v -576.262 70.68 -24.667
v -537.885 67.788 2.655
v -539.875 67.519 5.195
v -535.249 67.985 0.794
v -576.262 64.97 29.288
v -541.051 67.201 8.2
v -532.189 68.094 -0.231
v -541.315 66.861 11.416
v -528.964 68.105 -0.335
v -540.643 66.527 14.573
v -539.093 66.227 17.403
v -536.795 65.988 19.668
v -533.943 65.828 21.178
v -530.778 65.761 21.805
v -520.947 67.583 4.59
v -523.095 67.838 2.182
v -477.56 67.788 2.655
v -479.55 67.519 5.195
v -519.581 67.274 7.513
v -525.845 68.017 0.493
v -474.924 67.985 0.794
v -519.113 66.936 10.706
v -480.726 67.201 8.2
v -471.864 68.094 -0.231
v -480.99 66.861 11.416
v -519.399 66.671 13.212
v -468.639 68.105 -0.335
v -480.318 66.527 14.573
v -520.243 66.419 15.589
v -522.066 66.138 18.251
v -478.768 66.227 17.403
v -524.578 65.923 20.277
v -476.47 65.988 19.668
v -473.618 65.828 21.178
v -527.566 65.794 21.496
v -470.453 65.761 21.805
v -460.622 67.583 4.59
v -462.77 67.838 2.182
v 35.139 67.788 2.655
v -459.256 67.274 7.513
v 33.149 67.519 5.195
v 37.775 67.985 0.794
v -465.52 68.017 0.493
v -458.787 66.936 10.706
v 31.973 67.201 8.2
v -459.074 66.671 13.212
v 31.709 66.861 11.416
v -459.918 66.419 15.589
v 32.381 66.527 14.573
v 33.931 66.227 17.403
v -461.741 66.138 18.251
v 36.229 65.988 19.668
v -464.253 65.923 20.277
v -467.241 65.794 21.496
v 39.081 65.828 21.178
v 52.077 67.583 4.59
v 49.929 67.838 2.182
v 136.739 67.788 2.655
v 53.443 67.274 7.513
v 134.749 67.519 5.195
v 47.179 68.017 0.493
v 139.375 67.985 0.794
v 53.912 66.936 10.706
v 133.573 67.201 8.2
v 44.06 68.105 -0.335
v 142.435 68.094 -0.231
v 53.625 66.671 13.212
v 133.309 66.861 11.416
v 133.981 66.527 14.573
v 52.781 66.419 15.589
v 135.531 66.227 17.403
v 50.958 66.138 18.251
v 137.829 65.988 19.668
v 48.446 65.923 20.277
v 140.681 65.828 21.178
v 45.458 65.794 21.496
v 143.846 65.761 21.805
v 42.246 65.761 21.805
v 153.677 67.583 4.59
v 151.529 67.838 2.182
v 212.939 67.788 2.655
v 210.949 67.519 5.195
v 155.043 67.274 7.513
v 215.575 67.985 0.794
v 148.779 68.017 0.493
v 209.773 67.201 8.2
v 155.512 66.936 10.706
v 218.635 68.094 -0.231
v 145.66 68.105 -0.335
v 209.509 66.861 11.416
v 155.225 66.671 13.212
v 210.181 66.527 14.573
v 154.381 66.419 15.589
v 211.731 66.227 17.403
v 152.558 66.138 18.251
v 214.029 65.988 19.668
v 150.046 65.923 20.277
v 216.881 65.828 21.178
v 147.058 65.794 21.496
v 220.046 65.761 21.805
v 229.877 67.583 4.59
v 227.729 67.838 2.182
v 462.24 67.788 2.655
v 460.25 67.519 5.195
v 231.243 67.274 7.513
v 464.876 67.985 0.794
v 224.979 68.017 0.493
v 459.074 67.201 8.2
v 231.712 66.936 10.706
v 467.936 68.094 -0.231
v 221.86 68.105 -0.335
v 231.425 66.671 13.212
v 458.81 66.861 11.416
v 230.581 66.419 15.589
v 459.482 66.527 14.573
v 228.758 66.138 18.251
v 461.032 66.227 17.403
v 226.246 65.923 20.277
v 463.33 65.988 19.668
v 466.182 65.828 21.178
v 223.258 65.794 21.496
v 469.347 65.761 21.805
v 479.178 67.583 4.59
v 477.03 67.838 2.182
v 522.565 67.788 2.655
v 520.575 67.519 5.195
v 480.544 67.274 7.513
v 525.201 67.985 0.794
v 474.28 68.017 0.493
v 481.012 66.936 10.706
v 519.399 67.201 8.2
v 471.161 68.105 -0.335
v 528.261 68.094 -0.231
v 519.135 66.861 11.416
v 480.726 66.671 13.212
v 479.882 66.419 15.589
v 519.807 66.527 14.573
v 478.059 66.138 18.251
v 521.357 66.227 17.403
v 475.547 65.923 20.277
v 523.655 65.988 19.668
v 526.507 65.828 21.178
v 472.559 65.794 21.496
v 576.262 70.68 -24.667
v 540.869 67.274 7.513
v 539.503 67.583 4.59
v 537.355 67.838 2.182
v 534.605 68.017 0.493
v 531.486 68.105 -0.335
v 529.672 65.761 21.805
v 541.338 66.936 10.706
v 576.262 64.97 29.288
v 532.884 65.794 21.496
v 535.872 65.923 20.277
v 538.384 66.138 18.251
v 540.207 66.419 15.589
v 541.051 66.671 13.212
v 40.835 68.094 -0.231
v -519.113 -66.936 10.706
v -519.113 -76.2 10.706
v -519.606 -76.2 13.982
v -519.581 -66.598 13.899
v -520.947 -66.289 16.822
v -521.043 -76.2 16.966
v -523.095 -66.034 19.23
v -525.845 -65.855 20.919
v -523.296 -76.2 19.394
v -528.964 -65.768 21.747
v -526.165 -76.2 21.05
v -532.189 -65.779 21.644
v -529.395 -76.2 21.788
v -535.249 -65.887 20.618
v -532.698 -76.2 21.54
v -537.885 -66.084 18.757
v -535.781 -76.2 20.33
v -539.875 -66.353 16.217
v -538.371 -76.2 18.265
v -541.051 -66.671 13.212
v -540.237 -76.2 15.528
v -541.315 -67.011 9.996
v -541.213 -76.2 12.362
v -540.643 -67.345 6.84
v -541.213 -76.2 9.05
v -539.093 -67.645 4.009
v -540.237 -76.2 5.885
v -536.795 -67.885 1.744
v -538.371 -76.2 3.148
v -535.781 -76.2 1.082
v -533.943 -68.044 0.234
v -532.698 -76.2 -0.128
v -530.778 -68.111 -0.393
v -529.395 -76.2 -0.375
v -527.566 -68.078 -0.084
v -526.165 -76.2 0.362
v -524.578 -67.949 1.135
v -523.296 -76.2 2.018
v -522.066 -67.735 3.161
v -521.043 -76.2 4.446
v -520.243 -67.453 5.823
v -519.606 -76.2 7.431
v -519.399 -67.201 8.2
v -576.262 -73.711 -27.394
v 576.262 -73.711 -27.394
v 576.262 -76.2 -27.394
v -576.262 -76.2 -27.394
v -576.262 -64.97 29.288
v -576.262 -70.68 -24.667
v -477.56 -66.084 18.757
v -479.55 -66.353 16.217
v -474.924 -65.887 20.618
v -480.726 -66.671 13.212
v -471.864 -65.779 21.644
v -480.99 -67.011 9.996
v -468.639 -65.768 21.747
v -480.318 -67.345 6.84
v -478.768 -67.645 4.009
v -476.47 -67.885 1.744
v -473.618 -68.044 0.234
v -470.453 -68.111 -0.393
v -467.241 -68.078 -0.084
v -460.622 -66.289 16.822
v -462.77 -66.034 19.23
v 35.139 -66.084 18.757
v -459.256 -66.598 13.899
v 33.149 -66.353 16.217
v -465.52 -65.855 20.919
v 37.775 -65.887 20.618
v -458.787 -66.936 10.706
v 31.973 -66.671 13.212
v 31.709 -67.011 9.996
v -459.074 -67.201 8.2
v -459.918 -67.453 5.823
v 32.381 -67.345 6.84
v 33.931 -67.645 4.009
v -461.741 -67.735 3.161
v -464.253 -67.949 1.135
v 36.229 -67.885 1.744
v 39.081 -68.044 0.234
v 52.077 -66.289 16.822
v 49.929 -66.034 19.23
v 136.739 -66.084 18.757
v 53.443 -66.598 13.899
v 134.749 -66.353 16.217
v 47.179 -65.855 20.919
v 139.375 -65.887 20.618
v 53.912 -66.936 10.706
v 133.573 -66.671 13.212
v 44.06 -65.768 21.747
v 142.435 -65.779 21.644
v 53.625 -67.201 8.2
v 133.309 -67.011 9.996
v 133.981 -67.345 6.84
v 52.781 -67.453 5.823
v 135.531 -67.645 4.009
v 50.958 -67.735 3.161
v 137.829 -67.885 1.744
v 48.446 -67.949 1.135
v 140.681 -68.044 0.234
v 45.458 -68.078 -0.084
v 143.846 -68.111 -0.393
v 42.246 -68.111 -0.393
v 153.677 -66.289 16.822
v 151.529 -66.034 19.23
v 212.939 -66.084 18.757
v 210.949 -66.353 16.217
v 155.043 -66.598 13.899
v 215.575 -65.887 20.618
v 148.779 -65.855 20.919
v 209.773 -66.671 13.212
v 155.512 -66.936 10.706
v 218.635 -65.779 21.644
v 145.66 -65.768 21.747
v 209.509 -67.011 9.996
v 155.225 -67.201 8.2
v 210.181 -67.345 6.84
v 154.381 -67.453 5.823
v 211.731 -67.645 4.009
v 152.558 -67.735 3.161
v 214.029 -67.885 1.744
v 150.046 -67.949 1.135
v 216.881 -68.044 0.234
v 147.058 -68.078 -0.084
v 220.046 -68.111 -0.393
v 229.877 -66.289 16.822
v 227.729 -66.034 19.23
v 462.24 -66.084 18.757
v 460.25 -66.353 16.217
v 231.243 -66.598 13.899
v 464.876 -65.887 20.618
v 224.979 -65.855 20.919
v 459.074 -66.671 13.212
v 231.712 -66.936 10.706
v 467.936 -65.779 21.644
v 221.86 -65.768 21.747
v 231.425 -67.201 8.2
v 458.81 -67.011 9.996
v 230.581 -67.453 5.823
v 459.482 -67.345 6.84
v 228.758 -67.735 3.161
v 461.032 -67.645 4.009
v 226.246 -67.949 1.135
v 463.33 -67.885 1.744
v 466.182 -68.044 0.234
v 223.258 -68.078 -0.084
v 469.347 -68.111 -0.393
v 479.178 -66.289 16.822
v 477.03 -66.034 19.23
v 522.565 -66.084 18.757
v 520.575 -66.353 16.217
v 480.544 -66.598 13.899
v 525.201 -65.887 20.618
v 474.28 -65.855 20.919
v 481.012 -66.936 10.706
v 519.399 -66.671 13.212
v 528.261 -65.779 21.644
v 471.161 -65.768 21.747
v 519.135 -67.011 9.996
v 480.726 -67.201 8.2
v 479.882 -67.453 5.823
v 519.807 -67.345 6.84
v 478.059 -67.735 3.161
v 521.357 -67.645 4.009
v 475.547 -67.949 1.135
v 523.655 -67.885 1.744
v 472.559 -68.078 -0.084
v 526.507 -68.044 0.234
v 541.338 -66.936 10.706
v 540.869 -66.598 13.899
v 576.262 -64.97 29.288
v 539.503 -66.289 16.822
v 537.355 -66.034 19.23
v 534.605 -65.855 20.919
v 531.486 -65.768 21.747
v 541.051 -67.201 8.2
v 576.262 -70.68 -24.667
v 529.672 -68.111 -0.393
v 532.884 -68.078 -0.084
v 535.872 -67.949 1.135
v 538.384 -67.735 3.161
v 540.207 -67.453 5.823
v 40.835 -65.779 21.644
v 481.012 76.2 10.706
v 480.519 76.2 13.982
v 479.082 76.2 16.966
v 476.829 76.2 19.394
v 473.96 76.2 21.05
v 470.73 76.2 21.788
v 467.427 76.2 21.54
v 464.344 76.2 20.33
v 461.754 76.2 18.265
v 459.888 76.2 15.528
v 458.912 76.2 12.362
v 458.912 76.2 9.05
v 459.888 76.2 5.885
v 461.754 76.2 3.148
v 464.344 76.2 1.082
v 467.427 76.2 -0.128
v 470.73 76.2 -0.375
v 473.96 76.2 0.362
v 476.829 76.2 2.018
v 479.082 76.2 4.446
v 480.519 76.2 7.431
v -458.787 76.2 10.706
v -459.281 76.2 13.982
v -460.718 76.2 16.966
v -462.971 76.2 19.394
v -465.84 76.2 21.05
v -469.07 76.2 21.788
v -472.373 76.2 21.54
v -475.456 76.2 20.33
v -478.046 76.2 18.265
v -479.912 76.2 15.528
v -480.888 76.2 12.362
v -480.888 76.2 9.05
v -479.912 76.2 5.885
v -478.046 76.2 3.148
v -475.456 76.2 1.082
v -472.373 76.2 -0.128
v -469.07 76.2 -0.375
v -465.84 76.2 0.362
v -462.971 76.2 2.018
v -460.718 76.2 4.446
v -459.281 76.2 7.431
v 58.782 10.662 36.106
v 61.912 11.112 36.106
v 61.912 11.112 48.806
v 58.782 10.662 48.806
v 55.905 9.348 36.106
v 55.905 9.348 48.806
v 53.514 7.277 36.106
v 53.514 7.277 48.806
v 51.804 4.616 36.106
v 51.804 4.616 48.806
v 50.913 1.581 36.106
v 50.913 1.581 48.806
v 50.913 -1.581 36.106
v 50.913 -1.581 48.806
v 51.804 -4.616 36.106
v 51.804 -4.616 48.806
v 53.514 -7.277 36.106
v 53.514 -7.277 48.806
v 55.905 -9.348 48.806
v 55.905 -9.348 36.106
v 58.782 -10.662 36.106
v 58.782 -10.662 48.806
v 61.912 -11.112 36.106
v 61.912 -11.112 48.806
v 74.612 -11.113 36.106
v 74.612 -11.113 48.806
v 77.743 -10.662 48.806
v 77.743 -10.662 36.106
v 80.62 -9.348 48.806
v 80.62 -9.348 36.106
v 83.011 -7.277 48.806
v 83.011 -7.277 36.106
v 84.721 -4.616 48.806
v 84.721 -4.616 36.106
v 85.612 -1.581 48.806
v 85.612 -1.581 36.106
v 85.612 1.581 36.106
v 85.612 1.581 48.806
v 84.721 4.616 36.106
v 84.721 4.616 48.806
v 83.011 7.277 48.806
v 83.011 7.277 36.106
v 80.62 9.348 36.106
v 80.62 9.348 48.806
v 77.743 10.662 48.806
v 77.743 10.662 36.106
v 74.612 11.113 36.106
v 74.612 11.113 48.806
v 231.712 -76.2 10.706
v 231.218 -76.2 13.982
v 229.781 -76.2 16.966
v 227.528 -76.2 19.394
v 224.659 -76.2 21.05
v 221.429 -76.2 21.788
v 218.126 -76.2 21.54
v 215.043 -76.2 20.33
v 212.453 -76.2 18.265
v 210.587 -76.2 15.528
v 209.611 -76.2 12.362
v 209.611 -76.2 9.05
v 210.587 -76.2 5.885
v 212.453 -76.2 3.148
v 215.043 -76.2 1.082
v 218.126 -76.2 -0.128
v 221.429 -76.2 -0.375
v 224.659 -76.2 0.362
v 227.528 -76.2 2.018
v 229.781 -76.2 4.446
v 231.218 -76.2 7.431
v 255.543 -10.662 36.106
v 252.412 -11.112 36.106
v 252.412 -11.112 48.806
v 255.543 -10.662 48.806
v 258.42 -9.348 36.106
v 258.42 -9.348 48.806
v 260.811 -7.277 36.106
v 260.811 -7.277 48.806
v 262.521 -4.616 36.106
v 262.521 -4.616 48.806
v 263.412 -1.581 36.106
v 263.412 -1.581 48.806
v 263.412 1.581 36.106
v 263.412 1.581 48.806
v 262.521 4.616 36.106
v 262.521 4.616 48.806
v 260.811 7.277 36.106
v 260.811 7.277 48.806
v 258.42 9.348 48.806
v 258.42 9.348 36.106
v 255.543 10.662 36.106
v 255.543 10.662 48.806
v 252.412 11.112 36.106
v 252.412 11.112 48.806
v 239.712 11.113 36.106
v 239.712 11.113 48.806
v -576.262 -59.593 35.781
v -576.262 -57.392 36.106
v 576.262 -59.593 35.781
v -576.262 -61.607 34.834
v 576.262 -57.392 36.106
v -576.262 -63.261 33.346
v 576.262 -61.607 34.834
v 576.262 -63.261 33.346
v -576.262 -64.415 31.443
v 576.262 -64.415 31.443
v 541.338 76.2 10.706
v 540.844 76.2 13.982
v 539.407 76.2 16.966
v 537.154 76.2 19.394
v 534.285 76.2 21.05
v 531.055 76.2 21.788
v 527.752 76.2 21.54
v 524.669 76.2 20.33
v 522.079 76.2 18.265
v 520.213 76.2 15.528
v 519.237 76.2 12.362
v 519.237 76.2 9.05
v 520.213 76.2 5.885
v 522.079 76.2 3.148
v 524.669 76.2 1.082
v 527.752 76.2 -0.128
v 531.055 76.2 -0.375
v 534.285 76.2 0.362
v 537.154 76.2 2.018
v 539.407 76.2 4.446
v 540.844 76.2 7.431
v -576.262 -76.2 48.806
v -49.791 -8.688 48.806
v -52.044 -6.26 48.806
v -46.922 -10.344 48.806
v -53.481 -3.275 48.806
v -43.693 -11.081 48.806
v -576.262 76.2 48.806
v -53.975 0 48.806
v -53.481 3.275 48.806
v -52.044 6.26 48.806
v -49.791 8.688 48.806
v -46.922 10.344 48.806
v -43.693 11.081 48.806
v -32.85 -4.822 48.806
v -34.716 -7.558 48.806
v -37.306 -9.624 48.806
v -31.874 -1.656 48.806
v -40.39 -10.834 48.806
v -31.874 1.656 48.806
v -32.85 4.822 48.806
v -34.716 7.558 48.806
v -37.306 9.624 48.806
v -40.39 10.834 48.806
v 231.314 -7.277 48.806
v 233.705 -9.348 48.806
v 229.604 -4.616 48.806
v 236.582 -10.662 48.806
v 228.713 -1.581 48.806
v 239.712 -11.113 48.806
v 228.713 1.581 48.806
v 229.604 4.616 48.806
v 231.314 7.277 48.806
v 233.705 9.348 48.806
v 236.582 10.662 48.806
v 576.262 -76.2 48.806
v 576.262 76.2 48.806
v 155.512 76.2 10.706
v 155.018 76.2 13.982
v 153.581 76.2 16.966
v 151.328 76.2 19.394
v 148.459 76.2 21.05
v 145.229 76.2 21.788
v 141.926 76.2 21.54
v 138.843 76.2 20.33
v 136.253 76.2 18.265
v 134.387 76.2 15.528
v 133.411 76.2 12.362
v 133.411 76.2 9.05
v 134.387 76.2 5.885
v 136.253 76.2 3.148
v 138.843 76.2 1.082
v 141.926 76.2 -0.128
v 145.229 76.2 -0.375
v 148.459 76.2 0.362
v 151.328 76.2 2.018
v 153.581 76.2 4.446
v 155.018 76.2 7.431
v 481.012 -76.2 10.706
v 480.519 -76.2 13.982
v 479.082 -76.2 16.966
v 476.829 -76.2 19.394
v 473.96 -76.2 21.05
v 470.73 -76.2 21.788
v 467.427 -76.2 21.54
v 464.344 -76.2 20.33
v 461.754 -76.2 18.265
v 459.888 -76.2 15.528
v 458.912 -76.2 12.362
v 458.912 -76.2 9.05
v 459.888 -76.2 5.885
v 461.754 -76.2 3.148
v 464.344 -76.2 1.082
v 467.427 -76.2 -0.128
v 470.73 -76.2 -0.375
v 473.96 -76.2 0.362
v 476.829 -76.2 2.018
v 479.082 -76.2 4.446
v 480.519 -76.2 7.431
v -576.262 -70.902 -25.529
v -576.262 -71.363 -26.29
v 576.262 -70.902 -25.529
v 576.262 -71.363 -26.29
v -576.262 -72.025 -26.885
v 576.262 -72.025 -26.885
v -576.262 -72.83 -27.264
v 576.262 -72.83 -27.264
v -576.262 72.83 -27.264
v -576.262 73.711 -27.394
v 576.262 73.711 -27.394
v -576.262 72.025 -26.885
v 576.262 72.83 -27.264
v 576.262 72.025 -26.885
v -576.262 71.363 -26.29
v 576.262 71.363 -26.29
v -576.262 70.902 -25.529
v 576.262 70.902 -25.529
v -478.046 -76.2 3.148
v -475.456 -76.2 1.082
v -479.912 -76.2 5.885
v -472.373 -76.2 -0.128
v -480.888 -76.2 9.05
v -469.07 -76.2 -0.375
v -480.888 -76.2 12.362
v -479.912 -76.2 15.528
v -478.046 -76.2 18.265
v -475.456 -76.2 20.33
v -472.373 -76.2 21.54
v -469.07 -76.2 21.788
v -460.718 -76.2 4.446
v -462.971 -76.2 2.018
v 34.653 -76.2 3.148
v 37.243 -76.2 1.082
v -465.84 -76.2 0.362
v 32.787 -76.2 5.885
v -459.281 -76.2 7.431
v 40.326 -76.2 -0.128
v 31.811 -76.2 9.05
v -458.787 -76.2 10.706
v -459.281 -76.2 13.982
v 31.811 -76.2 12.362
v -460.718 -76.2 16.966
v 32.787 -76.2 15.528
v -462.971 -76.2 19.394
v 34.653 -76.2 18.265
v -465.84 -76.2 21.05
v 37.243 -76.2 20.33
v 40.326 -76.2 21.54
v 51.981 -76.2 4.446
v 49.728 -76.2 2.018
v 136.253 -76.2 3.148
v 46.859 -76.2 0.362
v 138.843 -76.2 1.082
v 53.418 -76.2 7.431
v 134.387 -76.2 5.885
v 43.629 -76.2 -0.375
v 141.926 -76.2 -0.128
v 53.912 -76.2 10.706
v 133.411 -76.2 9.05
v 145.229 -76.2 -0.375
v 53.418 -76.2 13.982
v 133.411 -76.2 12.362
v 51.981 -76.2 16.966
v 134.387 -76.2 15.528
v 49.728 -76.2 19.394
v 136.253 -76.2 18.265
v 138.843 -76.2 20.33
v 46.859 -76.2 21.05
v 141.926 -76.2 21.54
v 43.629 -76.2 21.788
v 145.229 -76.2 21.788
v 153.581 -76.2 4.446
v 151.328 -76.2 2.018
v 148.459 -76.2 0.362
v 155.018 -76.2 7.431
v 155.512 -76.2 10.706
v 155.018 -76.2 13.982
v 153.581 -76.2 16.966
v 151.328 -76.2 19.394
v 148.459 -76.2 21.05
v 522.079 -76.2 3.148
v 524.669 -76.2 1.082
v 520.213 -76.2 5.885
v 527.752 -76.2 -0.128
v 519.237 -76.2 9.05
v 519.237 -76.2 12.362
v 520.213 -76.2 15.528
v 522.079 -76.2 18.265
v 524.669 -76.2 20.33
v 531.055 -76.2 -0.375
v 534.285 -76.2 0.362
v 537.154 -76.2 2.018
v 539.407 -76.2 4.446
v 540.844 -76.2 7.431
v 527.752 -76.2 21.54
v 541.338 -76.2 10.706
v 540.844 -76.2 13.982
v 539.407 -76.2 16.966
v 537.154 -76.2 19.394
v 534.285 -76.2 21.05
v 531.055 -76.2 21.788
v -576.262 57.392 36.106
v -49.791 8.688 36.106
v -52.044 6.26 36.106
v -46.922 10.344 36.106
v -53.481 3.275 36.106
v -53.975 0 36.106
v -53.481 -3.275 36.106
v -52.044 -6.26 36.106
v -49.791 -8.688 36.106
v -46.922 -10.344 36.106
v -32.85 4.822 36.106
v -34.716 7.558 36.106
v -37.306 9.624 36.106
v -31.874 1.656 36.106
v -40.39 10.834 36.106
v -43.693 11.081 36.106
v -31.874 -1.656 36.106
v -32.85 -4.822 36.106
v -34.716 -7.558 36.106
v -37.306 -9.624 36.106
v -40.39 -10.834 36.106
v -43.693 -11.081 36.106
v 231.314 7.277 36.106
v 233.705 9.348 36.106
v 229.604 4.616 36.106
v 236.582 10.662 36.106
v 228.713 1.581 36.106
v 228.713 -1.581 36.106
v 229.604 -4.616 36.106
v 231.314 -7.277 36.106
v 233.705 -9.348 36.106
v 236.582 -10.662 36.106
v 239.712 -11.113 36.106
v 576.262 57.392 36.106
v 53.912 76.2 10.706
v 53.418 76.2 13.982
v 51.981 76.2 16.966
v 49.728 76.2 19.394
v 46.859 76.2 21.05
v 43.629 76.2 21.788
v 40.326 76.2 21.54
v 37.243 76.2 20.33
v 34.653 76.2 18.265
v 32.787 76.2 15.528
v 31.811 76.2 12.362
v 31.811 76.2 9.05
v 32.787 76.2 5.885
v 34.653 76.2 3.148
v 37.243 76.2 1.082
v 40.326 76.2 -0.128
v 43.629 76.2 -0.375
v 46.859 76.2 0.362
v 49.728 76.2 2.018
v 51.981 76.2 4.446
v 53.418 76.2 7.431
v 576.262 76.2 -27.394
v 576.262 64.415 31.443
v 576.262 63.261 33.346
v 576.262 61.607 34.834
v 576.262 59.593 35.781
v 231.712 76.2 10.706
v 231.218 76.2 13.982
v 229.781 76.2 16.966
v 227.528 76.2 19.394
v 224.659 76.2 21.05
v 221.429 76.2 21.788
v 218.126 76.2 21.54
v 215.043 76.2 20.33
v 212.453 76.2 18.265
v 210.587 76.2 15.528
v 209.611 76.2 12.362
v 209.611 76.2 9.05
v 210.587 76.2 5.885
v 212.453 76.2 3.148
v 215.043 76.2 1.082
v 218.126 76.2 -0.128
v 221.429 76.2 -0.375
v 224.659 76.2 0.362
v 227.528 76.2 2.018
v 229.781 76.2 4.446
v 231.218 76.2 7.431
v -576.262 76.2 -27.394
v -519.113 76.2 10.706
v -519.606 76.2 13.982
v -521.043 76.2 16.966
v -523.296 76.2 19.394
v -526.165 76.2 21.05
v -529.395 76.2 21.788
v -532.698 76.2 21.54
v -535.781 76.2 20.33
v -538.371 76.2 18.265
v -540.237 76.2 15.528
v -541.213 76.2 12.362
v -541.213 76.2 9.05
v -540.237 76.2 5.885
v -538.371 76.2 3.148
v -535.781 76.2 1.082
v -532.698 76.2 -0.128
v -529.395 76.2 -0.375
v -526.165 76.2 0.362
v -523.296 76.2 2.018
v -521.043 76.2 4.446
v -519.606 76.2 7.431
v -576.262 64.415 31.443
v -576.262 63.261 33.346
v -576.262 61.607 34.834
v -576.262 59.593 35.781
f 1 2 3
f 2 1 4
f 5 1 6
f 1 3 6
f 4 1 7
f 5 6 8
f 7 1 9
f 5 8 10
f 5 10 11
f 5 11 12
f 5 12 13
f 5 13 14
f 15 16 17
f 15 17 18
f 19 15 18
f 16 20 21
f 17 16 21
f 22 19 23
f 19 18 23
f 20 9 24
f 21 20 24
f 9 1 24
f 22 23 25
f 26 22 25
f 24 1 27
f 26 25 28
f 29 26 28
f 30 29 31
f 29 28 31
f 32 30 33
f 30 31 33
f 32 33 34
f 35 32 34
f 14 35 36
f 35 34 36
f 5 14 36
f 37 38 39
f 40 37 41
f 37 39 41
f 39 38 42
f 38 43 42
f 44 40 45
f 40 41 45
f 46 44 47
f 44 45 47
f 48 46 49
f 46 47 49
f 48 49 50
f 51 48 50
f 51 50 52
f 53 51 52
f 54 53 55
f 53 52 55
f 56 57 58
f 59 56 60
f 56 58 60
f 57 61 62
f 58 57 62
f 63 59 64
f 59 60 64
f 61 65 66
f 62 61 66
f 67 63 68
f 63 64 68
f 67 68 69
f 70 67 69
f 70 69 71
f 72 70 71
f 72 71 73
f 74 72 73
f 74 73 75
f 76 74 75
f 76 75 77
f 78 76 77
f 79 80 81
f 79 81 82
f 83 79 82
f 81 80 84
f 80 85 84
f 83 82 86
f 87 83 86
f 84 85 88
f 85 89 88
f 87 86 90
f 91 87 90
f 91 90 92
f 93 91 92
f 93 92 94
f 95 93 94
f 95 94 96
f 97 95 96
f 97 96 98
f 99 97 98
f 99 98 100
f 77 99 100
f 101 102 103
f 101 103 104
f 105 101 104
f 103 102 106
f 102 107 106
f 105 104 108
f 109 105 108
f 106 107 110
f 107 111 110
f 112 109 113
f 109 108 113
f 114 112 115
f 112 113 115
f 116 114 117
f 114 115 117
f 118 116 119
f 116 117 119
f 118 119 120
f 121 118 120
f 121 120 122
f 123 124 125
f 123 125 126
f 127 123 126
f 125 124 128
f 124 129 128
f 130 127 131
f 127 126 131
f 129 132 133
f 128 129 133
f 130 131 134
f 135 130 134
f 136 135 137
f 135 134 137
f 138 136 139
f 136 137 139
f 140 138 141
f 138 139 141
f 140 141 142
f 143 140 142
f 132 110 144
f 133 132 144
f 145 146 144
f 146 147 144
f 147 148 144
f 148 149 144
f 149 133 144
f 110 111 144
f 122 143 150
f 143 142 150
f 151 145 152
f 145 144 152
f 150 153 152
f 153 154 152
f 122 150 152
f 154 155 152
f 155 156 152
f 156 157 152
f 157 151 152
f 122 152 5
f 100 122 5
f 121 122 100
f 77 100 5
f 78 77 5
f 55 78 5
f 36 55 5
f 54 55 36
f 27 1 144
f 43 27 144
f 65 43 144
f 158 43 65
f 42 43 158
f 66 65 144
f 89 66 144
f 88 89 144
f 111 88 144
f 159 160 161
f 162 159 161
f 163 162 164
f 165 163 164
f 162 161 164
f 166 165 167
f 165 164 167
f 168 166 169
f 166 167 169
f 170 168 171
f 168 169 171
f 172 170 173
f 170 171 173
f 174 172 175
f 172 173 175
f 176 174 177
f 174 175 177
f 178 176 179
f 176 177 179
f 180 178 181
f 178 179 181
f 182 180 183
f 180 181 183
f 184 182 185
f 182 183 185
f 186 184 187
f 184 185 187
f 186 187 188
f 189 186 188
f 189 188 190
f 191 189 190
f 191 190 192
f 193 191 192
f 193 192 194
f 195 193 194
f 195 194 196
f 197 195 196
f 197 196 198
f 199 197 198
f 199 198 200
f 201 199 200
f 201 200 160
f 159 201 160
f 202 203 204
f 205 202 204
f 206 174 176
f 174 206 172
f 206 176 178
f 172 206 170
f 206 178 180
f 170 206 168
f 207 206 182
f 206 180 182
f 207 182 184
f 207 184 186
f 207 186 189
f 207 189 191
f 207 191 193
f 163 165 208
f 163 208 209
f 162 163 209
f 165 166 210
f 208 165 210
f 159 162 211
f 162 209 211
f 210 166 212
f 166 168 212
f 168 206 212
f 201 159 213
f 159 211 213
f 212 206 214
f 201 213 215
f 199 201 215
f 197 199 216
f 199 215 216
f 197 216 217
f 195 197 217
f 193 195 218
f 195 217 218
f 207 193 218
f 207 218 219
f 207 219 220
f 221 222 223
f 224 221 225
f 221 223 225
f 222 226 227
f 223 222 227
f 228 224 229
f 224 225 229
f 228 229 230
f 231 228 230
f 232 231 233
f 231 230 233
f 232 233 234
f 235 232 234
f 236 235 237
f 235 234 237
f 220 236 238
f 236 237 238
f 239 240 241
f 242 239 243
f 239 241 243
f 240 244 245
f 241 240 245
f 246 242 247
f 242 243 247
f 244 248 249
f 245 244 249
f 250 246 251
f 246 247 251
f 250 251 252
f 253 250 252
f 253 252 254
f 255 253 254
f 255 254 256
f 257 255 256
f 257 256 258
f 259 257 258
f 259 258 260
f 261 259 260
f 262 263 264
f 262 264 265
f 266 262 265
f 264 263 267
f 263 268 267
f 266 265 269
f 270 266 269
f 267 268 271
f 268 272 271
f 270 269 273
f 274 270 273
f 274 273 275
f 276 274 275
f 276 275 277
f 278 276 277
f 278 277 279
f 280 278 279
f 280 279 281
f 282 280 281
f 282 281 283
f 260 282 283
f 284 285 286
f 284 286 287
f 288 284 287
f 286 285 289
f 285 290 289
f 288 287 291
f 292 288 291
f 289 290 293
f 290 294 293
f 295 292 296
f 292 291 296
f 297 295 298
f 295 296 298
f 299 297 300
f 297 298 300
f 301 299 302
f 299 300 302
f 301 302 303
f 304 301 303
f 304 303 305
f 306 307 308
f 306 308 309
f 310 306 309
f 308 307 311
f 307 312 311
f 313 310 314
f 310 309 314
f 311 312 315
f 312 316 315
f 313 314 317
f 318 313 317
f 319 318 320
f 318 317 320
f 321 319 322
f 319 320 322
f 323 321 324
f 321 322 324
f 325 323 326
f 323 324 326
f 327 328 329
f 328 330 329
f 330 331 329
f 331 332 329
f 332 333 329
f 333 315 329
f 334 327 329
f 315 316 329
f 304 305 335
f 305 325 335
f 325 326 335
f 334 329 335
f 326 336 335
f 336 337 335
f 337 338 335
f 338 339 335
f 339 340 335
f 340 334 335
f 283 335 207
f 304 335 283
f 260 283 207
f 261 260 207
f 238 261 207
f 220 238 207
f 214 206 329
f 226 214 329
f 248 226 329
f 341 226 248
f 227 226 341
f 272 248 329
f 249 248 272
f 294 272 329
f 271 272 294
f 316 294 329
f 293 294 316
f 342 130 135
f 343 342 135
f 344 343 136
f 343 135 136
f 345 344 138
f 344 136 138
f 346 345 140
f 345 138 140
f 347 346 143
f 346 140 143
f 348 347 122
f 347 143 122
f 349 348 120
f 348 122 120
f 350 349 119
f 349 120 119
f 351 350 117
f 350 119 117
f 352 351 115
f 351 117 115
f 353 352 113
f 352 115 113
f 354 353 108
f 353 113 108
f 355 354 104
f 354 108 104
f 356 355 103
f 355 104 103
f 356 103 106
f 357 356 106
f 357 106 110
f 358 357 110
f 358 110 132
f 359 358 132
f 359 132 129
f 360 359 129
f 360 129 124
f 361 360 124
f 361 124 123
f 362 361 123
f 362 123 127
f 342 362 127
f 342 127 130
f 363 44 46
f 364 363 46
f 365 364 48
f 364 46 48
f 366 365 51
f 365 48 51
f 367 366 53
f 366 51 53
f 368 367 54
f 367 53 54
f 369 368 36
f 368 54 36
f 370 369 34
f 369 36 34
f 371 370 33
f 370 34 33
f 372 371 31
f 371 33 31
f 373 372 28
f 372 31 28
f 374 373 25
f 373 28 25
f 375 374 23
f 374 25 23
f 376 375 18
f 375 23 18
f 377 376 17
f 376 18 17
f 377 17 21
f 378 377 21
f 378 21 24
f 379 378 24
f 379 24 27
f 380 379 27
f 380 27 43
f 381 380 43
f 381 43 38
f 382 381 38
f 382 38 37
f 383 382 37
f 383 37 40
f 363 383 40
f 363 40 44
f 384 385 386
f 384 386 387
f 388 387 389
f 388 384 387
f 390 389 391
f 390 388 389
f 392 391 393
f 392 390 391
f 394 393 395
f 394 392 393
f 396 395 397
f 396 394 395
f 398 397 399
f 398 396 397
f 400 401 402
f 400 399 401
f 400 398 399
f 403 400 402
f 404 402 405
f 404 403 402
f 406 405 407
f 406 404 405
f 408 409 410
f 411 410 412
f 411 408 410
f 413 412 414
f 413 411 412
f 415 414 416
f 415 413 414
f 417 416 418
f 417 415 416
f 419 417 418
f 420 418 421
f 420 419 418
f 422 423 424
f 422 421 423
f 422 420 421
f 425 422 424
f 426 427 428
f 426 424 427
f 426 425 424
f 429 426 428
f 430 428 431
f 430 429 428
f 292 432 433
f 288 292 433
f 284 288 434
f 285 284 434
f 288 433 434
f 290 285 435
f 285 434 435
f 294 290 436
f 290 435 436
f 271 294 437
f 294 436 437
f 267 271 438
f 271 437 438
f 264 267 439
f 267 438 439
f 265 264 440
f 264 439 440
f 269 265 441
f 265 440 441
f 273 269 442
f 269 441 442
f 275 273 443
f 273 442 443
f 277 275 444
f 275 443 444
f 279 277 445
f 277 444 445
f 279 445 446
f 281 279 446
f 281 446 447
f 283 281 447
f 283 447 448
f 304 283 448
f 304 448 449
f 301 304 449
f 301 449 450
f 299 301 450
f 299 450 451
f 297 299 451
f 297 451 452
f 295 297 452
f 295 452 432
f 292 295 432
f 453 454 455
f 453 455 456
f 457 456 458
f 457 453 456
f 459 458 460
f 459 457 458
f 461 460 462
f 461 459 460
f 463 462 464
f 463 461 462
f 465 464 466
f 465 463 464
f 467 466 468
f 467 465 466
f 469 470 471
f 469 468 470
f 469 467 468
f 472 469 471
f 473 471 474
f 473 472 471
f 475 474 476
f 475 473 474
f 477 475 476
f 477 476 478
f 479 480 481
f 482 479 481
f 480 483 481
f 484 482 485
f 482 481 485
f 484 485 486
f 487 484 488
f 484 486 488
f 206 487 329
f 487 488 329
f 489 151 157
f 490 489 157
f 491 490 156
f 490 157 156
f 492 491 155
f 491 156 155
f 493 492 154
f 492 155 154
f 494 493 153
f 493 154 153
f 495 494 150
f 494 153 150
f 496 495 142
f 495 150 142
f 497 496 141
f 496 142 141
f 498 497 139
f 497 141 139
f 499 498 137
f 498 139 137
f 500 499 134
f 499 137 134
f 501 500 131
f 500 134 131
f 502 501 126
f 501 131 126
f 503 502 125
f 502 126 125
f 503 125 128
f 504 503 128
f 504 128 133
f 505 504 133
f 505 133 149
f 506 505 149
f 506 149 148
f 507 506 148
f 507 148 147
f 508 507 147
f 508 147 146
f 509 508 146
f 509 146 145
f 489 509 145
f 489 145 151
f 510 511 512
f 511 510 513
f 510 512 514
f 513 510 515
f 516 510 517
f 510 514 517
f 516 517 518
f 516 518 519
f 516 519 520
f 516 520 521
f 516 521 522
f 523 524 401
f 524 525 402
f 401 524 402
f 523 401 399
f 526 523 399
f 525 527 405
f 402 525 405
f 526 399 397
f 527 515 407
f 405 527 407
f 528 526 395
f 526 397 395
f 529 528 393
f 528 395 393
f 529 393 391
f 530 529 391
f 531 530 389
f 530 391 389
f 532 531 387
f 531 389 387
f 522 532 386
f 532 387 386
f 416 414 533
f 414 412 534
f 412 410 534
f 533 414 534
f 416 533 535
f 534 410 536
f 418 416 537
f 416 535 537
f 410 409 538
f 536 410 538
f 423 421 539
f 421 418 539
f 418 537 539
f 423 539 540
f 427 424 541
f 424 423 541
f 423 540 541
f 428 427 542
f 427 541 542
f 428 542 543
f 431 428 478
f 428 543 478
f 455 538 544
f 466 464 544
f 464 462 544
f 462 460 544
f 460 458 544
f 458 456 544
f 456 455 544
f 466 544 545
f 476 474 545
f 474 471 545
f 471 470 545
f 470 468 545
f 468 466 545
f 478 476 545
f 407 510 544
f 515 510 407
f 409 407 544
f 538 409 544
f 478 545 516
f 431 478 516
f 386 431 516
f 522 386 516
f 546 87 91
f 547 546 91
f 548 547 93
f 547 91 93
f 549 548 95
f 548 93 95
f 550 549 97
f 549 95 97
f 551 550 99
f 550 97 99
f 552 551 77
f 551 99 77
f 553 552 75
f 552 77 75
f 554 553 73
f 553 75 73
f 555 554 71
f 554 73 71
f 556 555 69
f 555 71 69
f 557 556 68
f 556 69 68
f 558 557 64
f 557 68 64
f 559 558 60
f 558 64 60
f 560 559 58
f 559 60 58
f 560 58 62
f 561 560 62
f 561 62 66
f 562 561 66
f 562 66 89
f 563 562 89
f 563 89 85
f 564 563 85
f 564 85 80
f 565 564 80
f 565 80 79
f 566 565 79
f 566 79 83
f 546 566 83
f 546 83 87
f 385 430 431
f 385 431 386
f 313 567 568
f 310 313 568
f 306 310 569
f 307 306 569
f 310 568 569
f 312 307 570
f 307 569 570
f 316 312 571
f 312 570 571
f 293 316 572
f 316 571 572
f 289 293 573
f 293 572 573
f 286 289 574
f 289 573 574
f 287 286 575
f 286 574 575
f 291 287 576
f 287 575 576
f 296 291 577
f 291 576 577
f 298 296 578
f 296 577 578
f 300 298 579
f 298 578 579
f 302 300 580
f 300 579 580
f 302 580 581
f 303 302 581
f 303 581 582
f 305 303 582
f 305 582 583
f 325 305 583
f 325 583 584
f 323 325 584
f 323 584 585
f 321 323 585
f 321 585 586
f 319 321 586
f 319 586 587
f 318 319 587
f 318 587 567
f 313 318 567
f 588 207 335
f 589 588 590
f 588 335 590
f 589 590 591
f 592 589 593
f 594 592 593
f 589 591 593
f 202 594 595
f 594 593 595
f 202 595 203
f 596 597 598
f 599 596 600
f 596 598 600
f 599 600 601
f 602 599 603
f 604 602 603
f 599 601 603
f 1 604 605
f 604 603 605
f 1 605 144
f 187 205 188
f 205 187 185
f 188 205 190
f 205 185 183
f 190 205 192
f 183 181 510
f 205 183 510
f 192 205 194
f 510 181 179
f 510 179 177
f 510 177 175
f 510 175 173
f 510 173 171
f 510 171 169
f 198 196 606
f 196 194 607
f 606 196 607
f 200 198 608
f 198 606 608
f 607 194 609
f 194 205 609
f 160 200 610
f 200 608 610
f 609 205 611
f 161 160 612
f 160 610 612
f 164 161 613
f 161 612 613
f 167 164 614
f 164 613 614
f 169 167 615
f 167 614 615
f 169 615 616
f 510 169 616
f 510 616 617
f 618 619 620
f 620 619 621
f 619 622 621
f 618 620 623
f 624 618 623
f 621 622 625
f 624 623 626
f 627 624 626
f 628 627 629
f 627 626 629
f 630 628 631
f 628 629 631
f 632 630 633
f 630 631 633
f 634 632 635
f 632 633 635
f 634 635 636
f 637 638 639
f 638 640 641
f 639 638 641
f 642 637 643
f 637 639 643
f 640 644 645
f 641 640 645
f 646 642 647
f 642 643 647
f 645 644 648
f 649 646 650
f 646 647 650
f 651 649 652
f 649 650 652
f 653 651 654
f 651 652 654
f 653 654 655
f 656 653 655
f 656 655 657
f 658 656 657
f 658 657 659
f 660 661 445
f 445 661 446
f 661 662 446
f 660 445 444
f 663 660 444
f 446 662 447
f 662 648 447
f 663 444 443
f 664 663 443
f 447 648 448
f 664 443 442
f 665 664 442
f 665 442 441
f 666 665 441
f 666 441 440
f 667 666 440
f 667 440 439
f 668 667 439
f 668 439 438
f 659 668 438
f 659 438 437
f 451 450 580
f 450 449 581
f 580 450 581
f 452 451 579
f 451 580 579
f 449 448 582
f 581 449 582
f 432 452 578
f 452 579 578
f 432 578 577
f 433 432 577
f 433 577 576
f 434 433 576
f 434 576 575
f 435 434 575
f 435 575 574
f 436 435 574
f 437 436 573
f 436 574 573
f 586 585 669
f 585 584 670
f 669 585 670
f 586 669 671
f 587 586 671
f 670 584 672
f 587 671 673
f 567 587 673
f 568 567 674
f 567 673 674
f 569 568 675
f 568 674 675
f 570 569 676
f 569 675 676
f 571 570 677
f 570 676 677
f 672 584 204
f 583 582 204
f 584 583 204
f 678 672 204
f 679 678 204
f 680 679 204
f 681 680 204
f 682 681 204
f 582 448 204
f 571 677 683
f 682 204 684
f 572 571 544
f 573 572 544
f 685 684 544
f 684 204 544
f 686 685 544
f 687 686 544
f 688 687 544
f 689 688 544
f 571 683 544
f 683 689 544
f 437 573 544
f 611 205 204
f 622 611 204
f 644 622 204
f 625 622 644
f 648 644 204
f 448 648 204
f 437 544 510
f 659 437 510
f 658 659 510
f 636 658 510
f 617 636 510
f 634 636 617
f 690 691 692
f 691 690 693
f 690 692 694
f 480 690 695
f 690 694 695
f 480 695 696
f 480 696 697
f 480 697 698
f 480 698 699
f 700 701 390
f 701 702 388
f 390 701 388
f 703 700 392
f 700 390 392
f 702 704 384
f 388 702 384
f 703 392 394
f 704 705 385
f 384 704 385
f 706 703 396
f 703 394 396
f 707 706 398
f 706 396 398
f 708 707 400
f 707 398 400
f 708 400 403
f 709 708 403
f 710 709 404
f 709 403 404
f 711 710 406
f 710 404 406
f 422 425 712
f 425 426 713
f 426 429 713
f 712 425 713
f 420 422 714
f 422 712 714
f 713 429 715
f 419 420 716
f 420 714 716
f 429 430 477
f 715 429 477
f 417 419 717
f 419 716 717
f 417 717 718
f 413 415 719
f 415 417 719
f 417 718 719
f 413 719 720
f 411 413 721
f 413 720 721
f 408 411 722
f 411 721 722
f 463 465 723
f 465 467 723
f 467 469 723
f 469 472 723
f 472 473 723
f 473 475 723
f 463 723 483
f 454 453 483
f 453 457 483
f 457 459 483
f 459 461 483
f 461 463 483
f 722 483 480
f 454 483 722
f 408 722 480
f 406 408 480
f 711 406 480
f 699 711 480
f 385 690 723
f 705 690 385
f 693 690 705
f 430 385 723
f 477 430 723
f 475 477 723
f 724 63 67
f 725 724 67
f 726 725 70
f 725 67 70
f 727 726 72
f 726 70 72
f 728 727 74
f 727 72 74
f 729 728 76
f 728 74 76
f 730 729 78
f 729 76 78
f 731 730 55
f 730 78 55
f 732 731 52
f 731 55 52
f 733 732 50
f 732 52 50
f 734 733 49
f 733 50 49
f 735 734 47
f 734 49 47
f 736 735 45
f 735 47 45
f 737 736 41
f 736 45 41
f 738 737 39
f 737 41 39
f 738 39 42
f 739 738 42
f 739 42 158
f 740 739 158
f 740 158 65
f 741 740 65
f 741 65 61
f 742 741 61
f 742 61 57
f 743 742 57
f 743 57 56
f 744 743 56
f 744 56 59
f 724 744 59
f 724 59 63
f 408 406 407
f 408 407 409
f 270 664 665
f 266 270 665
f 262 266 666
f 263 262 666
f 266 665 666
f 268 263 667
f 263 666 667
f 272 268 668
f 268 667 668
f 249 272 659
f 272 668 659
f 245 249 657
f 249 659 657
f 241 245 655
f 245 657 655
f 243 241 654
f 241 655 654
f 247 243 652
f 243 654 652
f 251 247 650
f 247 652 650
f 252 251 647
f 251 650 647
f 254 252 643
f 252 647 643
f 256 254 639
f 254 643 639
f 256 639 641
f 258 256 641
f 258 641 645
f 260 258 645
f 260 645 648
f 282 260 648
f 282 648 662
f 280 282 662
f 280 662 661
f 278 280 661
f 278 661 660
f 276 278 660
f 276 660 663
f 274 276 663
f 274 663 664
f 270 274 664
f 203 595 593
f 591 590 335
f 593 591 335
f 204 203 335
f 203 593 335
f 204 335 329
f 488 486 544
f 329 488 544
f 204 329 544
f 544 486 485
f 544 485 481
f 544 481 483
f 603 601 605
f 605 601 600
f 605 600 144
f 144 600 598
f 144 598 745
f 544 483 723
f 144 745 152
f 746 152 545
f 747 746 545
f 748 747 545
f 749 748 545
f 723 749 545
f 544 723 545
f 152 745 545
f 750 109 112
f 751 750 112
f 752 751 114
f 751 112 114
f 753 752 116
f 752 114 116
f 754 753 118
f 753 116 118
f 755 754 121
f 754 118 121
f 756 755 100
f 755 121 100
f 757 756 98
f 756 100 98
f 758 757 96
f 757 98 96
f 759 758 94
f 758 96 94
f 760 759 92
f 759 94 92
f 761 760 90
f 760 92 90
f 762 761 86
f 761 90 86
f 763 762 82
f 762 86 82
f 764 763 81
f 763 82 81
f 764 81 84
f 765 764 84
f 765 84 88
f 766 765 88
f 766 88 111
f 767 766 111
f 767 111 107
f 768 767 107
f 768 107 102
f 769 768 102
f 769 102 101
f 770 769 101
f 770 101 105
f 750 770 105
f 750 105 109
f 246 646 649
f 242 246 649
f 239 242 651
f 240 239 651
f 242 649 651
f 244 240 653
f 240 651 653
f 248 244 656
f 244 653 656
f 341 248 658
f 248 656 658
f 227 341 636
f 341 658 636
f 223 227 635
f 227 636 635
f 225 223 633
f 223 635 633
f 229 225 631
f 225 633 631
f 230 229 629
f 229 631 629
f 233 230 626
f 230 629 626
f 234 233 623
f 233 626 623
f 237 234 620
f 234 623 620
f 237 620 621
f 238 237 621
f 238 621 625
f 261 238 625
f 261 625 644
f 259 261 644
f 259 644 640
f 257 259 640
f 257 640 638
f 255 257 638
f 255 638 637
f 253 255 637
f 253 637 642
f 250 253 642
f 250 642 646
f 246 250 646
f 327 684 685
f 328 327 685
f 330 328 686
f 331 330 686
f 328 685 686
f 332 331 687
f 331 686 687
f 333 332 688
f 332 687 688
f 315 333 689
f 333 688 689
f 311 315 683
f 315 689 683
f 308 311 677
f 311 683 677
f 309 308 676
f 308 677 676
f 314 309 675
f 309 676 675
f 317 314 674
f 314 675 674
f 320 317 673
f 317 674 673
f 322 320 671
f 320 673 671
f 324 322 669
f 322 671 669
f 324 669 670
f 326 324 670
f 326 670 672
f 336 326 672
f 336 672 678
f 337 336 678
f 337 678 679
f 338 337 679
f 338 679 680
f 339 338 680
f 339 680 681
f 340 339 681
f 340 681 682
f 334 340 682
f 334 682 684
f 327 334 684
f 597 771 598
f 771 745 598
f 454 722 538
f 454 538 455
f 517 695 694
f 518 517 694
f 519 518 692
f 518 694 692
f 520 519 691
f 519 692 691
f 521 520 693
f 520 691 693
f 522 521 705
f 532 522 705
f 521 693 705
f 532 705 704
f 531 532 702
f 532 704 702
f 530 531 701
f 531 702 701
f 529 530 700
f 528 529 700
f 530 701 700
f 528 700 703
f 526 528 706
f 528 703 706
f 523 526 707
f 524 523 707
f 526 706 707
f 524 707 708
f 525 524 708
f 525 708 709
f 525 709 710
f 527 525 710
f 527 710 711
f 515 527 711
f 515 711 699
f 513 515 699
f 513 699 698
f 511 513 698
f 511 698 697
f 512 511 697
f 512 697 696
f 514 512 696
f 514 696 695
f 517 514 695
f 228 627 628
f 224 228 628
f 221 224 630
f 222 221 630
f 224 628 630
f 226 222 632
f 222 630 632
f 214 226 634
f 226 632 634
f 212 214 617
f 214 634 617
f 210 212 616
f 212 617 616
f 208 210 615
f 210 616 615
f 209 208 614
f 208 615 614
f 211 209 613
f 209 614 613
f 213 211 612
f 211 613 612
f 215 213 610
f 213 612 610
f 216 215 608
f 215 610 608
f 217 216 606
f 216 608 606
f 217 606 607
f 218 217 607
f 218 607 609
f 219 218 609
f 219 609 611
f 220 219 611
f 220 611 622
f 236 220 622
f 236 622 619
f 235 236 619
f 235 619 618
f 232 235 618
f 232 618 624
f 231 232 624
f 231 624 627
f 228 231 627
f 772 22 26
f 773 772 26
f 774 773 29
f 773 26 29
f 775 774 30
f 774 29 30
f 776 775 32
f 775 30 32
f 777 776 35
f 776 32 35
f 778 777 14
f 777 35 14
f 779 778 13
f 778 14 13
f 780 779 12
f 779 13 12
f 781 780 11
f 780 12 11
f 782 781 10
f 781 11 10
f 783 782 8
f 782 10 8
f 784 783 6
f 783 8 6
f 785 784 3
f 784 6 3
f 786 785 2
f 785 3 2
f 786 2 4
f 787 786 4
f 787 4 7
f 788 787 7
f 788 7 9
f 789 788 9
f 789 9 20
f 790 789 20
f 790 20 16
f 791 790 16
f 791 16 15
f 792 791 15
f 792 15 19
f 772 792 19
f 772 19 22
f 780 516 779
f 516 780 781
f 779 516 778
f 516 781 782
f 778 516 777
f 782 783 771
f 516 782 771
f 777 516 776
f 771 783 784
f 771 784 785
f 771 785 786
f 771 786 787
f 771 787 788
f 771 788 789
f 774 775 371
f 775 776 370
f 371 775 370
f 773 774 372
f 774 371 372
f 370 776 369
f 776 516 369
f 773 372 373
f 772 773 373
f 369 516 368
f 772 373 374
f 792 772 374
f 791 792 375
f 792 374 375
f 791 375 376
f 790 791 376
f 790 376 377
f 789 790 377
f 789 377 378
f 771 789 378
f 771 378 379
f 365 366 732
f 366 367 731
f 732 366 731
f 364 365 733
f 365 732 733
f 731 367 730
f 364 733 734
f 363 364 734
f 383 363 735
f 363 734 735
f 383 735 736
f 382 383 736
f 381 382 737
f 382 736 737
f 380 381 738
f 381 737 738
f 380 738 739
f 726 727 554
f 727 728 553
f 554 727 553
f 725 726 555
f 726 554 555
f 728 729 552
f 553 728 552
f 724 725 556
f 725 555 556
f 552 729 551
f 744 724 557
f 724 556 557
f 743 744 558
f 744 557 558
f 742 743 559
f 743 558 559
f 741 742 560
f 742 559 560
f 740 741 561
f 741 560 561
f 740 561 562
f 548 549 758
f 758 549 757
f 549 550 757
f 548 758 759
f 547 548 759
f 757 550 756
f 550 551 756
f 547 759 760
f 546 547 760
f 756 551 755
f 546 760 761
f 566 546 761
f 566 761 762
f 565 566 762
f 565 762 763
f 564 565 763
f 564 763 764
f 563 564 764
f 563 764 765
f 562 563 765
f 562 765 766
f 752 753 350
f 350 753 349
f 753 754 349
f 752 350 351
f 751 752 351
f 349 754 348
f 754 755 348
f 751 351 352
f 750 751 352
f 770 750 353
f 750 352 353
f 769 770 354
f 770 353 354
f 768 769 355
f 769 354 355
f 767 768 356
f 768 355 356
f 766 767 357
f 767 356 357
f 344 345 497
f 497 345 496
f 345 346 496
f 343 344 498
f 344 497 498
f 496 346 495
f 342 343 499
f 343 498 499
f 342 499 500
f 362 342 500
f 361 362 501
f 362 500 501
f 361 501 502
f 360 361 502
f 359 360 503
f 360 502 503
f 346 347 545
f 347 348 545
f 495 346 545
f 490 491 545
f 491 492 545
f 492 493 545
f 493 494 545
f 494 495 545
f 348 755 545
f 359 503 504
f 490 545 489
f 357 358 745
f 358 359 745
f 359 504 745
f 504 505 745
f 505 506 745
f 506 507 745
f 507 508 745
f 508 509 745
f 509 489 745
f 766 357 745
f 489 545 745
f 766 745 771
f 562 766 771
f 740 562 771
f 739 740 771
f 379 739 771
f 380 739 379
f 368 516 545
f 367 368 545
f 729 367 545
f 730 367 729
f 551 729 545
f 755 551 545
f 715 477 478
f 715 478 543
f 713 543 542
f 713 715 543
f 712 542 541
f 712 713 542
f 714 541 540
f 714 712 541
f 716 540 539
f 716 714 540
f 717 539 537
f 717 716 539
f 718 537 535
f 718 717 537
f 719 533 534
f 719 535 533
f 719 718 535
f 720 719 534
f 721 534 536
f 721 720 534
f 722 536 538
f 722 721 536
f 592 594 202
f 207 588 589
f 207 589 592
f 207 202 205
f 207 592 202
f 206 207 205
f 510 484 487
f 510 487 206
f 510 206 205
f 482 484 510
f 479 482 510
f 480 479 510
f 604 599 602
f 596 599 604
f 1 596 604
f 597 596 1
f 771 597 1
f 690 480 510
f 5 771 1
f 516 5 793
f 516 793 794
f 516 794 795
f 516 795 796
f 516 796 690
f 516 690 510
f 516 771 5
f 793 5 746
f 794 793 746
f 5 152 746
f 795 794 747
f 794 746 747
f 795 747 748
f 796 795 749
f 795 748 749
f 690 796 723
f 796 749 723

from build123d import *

# Parameters (mm, degrees)
BOSS_EXTRUDE1_DEPTH = 576.2625
SKETCH5_R           = 11.1125
CUT_EXTRUDE3_DEPTH  = 152.4
SKETCH6_R           = 11.1125
CUT_EXTRUDE4_DEPTH  = 13.7


with BuildPart() as part:
    # Sketch1 → Boss-Extrude1 (new body, symmetric)
    with BuildSketch(Plane(origin=(0, 0, 0), x_dir=(0, 0, -1), z_dir=(1, 0, 0))):
        with BuildLine():
            Line((-48.8061, -76.2), (-48.8061, 76.2))
            Line((-48.8061, 76.2), (27.3939, 76.2))
            Line((27.3939, 76.2), (27.3939, 73.710744653))
            ThreePointArc((27.3939, 73.710744653), (26.61173954, 71.672050174), (24.666685315, 70.679672107))
            Line((24.666685315, 70.679672107), (-29.288063286, 64.969518115))
            ThreePointArc((-29.288063286, 64.969518115), (-34.150698849, 62.488572947), (-36.1061, 57.391836749))
            Line((-36.1061, 57.391836749), (-36.1061, -57.391836749))
            ThreePointArc((-36.1061, -57.391836749), (-34.150698849, -62.488572947), (-29.288063286, -64.969518115))
            Line((-29.288063286, -64.969518115), (24.666685315, -70.679672107))
            ThreePointArc((24.666685315, -70.679672107), (26.61173954, -71.672050174), (27.3939, -73.710744653))
            Line((27.3939, -73.710744653), (27.3939, -76.2))
            Line((27.3939, -76.2), (-48.8061, -76.2))
        make_face()
    extrude(amount=BOSS_EXTRUDE1_DEPTH, both=True)

    # Sketch5 → Cut-Extrude3 (cut)
    with BuildSketch(Plane.XZ.offset(76.2)):
        with Locations((530.225, 10.7061)):
            Circle(SKETCH5_R)
        with Locations((469.9, 10.7061)):
            Circle(SKETCH5_R)
        with Locations((42.799, 10.7061)):
            Circle(SKETCH5_R)
        with Locations((220.599, 10.7061)):
            Circle(SKETCH5_R)
        with Locations((144.399, 10.7061)):
            Circle(SKETCH5_R)
        with Locations((-530.225, 10.7061)):
            Circle(SKETCH5_R)
        with Locations((-469.9, 10.7061)):
            Circle(SKETCH5_R)
    extrude(amount=-CUT_EXTRUDE3_DEPTH, mode=Mode.SUBTRACT)

    # Sketch6 → Cut-Extrude4 (cut, through all)
    with BuildSketch(Plane(origin=(0, 0, 36.1061), x_dir=(-1, 0, 0), z_dir=(0, 0, -1))):
        with Locations((42.8625, 0)):
            Circle(SKETCH6_R)
        with BuildLine():
            Line((-74.6125, 11.1125), (-61.9125, 11.1125))
            ThreePointArc((-61.9125, 11.1125), (-50.8, 0), (-61.9125, -11.1125))
            Line((-61.9125, -11.1125), (-74.6125, -11.1125))
            ThreePointArc((-74.6125, -11.1125), (-85.725, 0), (-74.6125, 11.1125))
        make_face()
        with BuildLine():
            Line((-239.7125, -11.1125), (-252.4125, -11.1125))
            ThreePointArc((-252.4125, -11.1125), (-263.525, 0), (-252.4125, 11.1125))
            Line((-252.4125, 11.1125), (-239.7125, 11.1125))
            ThreePointArc((-239.7125, 11.1125), (-228.6, 0), (-239.7125, -11.1125))
        make_face()
    extrude(amount=-CUT_EXTRUDE4_DEPTH, mode=Mode.SUBTRACT)


solid = part.part
